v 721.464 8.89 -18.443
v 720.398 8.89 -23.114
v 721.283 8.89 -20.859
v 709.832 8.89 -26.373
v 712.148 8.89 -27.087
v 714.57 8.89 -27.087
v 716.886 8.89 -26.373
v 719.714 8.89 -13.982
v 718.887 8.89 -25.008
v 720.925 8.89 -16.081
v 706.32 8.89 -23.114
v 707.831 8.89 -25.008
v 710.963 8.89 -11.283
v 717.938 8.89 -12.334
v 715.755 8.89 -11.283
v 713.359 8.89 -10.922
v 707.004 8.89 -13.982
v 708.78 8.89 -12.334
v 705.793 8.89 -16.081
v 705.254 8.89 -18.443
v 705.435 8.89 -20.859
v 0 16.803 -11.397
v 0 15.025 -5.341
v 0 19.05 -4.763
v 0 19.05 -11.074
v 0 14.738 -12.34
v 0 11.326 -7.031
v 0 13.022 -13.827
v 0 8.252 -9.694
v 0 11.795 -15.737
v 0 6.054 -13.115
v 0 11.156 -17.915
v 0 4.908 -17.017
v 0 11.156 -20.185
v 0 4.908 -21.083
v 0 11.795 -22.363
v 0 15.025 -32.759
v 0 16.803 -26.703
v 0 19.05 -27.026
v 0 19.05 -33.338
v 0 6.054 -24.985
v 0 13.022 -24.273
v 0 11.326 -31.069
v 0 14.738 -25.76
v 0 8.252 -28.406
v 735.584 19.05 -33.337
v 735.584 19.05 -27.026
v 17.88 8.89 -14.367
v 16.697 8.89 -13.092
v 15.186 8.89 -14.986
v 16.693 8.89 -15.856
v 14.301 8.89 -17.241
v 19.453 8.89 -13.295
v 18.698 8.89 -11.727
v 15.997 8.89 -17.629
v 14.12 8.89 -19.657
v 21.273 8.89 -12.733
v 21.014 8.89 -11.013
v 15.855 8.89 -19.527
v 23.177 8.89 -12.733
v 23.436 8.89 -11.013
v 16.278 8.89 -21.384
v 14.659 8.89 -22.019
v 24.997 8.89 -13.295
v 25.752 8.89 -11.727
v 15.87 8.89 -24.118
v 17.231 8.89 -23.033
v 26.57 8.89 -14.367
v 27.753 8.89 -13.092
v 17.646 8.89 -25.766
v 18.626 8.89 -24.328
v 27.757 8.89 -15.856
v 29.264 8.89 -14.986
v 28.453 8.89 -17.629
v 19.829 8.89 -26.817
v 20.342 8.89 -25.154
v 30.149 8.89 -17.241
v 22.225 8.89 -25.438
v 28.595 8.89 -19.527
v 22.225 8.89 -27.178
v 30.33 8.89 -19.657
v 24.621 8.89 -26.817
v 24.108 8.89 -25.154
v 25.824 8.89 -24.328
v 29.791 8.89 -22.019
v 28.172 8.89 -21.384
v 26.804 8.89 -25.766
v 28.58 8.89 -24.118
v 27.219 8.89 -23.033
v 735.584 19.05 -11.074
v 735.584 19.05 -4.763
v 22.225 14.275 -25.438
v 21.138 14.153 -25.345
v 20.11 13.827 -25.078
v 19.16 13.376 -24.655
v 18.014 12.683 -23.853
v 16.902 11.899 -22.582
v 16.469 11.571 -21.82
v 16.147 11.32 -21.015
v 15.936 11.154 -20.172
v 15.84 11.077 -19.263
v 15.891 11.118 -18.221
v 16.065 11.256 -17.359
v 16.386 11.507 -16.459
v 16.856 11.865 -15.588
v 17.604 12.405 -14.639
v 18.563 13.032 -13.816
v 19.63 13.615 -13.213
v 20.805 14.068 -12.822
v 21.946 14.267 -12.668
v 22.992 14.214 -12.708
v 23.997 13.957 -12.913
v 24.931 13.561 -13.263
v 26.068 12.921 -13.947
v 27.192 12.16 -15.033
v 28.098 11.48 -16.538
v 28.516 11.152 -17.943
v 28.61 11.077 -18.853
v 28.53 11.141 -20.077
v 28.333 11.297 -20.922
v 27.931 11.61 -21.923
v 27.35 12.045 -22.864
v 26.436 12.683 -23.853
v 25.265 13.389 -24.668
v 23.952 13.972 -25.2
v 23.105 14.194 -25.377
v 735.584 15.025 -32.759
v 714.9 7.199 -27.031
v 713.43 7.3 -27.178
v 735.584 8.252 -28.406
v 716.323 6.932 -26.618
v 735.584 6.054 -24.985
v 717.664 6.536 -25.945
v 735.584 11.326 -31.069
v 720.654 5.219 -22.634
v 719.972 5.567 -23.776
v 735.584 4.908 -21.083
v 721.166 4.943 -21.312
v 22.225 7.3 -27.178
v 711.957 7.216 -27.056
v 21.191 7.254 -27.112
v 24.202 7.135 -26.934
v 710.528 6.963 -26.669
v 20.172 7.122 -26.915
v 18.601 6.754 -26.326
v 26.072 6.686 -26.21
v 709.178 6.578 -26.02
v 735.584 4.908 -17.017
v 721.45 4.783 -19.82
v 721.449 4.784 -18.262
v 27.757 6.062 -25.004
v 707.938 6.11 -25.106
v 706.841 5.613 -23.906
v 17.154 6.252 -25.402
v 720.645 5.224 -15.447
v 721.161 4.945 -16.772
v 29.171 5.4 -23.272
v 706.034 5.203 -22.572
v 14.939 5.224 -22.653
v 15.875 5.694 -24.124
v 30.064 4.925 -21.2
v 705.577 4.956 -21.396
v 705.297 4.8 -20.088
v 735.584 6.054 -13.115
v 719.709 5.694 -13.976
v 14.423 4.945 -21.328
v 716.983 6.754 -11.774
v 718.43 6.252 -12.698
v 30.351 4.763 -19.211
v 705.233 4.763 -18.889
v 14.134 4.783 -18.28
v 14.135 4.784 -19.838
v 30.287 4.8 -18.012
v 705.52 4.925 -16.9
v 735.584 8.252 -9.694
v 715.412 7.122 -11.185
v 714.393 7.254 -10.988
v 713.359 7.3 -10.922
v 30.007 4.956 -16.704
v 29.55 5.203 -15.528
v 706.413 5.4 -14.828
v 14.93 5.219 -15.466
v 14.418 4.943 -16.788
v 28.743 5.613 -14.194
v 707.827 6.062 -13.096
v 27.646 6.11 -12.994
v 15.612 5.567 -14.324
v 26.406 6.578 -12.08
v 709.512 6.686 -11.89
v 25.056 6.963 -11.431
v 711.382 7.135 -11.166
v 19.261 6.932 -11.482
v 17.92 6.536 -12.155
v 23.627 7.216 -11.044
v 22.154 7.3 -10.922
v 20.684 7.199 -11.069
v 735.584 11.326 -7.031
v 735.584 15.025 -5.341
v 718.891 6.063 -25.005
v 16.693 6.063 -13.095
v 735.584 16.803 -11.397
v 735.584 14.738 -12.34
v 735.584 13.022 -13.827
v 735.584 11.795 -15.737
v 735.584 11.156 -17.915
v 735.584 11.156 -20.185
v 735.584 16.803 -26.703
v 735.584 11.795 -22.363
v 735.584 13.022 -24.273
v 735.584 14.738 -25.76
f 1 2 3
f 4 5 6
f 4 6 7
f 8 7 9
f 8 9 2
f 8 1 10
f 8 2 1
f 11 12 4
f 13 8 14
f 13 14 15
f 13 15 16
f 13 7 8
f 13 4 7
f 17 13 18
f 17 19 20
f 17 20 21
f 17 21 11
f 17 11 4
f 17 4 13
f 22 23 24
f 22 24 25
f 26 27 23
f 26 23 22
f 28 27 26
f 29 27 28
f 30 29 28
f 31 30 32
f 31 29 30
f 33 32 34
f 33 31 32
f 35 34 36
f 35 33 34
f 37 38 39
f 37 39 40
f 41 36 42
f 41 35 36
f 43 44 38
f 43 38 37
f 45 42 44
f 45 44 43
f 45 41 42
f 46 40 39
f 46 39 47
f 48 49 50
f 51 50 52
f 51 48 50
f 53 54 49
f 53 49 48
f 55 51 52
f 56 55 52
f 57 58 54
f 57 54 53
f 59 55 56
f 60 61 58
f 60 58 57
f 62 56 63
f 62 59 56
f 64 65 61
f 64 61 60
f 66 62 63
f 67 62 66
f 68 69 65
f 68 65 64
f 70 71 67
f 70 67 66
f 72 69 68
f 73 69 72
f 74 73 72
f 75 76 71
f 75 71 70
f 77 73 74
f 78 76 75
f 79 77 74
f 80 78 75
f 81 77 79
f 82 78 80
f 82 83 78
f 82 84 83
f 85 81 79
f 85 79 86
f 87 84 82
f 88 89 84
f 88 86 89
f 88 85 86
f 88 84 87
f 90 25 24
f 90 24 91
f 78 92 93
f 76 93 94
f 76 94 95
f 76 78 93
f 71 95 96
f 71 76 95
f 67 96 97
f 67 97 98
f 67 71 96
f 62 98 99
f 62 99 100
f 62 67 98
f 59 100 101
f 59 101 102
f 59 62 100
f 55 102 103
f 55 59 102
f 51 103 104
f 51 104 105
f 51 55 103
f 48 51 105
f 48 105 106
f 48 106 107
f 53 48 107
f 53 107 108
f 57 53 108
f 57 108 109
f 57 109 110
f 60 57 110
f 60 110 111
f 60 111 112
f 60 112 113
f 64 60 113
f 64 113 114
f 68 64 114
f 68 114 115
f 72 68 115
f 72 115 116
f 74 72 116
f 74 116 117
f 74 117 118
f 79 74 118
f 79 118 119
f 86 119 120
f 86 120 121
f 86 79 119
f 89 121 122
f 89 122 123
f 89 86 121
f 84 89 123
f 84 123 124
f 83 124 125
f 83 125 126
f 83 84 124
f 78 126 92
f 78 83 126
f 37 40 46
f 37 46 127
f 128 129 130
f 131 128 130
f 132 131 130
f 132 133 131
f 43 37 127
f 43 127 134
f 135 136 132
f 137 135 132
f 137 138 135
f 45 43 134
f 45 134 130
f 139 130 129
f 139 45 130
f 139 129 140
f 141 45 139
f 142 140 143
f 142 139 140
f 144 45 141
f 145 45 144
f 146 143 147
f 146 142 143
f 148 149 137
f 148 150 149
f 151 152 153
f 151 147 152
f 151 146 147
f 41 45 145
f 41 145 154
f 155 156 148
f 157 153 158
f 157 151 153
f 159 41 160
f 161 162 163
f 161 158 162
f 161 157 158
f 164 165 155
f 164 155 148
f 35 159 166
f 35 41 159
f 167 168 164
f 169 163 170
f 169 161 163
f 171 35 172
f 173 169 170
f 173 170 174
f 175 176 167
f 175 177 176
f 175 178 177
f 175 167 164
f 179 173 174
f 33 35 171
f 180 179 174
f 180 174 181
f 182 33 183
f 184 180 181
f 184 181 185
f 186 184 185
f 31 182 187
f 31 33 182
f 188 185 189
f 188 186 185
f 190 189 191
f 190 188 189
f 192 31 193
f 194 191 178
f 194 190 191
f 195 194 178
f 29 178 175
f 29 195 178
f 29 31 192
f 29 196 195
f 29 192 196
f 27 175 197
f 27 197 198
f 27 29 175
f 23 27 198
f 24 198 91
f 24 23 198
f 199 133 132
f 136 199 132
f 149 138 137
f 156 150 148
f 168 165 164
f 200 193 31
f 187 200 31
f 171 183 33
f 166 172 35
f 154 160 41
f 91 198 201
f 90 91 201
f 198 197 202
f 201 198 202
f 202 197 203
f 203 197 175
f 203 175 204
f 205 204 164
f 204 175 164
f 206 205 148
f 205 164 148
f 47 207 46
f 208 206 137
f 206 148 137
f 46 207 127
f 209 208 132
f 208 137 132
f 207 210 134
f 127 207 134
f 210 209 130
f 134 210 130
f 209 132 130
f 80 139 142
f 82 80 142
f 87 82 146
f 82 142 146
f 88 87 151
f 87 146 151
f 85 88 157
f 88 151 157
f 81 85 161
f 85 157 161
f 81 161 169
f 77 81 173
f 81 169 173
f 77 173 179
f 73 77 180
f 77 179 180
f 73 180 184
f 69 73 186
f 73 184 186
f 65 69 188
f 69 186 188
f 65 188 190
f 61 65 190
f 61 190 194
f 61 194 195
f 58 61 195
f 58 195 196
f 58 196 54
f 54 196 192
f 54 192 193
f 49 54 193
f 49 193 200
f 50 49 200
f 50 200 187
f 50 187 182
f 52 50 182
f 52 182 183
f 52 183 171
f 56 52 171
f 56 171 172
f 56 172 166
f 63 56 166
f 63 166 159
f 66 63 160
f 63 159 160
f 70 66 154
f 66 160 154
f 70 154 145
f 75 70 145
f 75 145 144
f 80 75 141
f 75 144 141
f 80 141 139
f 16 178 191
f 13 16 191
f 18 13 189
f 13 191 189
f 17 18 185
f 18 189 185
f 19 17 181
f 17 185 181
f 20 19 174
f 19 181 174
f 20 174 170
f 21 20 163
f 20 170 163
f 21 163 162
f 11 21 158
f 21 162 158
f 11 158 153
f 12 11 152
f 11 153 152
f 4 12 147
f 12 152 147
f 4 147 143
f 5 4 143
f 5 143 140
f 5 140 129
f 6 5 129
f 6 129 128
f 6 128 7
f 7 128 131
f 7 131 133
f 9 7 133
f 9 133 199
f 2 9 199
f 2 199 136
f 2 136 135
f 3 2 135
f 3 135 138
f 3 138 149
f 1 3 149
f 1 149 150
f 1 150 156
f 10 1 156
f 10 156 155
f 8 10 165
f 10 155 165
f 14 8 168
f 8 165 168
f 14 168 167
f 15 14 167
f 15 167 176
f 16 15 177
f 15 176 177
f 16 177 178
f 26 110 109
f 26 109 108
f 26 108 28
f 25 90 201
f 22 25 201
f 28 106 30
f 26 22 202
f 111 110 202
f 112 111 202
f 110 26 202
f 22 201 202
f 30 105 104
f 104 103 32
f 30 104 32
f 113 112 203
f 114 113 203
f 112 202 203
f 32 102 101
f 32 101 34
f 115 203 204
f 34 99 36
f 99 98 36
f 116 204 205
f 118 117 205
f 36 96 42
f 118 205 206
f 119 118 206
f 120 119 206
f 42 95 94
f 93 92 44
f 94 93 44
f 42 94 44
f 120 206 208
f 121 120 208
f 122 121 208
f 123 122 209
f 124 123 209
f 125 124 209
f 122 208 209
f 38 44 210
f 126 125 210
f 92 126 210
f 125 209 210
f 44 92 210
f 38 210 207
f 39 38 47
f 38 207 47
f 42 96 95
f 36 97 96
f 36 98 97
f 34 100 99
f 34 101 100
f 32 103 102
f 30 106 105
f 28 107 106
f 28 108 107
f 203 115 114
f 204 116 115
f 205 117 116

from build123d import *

# Parameters (mm, degrees)
SKETCH1_W                     = 735.584
SKETCH1_H                     = 38.1
WOOD_BLOCK_DEPTH              = 19.05
SKETCH2_R                     = 7.9756
INNER_BORE_DEPTH              = 737.816349952
SKETCH3_R                     = 6.3881
MOUTHPIECE_THROUGH_HOLE_DEPTH = 737.816349952
SKETCH5_R                     = 8.128
COUNTERBORE_DEPTH             = 8.89
SKETCH4_OUTSIDE_W             = 187.464
SKETCH4_OUTSIDE_H             = 168.414
SKETCH4_OUTSIDE_R             = 14.2875
OUTER_DIAMETER_DEPTH          = 737.816350054


with BuildPart() as part:
    # Sketch1 → wood block (new body)
    with BuildSketch(Plane(origin=(0, 0, 0), x_dir=(1, 0, 0), z_dir=(0, 1, 0))):
        with Locations((367.792, 19.05)):
            Rectangle(SKETCH1_W, SKETCH1_H)
    extrude(amount=WOOD_BLOCK_DEPTH)

    # Sketch2 → inner bore (cut, through all)
    with BuildSketch(Plane(origin=(735.584, 0, 0), x_dir=(0, 0, -1), z_dir=(1, 0, 0))):
        with Locations((19.05, 19.05)):
            Circle(SKETCH2_R)
    extrude(amount=-INNER_BORE_DEPTH, mode=Mode.SUBTRACT)

    # Sketch3 → mouthpiece through hole (cut, through all)
    with BuildSketch(Plane(origin=(0, 0, 0), x_dir=(1, 0, 0), z_dir=(0, 1, 0))):
        with Locations(Location((22.225, 19.05, 0), (0, 0, 90))):
            Circle(SKETCH3_R)
    extrude(amount=MOUTHPIECE_THROUGH_HOLE_DEPTH, mode=Mode.SUBTRACT)

    # Sketch5 → counterbore (cut)
    with BuildSketch(Plane.XZ):
        with Locations(Location((22.225, -19.05, 0), (0, 0, 270))):
            Circle(SKETCH5_R)
        with Locations(Location((713.359, -19.05, 0), (0, 0, 90))):
            Circle(SKETCH5_R)
    extrude(amount=-COUNTERBORE_DEPTH, mode=Mode.SUBTRACT)

    # Sketch4 outside → outer diameter (cut, through all)
    with BuildSketch(Plane.ZY):
        with Locations((-19.05, 9.525)):
            Rectangle(SKETCH4_OUTSIDE_W, SKETCH4_OUTSIDE_H)
        with Locations((-19.05, 19.05)):
            Circle(SKETCH4_OUTSIDE_R, mode=Mode.SUBTRACT)
    extrude(amount=-OUTER_DIAMETER_DEPTH, mode=Mode.SUBTRACT)


solid = part.part
